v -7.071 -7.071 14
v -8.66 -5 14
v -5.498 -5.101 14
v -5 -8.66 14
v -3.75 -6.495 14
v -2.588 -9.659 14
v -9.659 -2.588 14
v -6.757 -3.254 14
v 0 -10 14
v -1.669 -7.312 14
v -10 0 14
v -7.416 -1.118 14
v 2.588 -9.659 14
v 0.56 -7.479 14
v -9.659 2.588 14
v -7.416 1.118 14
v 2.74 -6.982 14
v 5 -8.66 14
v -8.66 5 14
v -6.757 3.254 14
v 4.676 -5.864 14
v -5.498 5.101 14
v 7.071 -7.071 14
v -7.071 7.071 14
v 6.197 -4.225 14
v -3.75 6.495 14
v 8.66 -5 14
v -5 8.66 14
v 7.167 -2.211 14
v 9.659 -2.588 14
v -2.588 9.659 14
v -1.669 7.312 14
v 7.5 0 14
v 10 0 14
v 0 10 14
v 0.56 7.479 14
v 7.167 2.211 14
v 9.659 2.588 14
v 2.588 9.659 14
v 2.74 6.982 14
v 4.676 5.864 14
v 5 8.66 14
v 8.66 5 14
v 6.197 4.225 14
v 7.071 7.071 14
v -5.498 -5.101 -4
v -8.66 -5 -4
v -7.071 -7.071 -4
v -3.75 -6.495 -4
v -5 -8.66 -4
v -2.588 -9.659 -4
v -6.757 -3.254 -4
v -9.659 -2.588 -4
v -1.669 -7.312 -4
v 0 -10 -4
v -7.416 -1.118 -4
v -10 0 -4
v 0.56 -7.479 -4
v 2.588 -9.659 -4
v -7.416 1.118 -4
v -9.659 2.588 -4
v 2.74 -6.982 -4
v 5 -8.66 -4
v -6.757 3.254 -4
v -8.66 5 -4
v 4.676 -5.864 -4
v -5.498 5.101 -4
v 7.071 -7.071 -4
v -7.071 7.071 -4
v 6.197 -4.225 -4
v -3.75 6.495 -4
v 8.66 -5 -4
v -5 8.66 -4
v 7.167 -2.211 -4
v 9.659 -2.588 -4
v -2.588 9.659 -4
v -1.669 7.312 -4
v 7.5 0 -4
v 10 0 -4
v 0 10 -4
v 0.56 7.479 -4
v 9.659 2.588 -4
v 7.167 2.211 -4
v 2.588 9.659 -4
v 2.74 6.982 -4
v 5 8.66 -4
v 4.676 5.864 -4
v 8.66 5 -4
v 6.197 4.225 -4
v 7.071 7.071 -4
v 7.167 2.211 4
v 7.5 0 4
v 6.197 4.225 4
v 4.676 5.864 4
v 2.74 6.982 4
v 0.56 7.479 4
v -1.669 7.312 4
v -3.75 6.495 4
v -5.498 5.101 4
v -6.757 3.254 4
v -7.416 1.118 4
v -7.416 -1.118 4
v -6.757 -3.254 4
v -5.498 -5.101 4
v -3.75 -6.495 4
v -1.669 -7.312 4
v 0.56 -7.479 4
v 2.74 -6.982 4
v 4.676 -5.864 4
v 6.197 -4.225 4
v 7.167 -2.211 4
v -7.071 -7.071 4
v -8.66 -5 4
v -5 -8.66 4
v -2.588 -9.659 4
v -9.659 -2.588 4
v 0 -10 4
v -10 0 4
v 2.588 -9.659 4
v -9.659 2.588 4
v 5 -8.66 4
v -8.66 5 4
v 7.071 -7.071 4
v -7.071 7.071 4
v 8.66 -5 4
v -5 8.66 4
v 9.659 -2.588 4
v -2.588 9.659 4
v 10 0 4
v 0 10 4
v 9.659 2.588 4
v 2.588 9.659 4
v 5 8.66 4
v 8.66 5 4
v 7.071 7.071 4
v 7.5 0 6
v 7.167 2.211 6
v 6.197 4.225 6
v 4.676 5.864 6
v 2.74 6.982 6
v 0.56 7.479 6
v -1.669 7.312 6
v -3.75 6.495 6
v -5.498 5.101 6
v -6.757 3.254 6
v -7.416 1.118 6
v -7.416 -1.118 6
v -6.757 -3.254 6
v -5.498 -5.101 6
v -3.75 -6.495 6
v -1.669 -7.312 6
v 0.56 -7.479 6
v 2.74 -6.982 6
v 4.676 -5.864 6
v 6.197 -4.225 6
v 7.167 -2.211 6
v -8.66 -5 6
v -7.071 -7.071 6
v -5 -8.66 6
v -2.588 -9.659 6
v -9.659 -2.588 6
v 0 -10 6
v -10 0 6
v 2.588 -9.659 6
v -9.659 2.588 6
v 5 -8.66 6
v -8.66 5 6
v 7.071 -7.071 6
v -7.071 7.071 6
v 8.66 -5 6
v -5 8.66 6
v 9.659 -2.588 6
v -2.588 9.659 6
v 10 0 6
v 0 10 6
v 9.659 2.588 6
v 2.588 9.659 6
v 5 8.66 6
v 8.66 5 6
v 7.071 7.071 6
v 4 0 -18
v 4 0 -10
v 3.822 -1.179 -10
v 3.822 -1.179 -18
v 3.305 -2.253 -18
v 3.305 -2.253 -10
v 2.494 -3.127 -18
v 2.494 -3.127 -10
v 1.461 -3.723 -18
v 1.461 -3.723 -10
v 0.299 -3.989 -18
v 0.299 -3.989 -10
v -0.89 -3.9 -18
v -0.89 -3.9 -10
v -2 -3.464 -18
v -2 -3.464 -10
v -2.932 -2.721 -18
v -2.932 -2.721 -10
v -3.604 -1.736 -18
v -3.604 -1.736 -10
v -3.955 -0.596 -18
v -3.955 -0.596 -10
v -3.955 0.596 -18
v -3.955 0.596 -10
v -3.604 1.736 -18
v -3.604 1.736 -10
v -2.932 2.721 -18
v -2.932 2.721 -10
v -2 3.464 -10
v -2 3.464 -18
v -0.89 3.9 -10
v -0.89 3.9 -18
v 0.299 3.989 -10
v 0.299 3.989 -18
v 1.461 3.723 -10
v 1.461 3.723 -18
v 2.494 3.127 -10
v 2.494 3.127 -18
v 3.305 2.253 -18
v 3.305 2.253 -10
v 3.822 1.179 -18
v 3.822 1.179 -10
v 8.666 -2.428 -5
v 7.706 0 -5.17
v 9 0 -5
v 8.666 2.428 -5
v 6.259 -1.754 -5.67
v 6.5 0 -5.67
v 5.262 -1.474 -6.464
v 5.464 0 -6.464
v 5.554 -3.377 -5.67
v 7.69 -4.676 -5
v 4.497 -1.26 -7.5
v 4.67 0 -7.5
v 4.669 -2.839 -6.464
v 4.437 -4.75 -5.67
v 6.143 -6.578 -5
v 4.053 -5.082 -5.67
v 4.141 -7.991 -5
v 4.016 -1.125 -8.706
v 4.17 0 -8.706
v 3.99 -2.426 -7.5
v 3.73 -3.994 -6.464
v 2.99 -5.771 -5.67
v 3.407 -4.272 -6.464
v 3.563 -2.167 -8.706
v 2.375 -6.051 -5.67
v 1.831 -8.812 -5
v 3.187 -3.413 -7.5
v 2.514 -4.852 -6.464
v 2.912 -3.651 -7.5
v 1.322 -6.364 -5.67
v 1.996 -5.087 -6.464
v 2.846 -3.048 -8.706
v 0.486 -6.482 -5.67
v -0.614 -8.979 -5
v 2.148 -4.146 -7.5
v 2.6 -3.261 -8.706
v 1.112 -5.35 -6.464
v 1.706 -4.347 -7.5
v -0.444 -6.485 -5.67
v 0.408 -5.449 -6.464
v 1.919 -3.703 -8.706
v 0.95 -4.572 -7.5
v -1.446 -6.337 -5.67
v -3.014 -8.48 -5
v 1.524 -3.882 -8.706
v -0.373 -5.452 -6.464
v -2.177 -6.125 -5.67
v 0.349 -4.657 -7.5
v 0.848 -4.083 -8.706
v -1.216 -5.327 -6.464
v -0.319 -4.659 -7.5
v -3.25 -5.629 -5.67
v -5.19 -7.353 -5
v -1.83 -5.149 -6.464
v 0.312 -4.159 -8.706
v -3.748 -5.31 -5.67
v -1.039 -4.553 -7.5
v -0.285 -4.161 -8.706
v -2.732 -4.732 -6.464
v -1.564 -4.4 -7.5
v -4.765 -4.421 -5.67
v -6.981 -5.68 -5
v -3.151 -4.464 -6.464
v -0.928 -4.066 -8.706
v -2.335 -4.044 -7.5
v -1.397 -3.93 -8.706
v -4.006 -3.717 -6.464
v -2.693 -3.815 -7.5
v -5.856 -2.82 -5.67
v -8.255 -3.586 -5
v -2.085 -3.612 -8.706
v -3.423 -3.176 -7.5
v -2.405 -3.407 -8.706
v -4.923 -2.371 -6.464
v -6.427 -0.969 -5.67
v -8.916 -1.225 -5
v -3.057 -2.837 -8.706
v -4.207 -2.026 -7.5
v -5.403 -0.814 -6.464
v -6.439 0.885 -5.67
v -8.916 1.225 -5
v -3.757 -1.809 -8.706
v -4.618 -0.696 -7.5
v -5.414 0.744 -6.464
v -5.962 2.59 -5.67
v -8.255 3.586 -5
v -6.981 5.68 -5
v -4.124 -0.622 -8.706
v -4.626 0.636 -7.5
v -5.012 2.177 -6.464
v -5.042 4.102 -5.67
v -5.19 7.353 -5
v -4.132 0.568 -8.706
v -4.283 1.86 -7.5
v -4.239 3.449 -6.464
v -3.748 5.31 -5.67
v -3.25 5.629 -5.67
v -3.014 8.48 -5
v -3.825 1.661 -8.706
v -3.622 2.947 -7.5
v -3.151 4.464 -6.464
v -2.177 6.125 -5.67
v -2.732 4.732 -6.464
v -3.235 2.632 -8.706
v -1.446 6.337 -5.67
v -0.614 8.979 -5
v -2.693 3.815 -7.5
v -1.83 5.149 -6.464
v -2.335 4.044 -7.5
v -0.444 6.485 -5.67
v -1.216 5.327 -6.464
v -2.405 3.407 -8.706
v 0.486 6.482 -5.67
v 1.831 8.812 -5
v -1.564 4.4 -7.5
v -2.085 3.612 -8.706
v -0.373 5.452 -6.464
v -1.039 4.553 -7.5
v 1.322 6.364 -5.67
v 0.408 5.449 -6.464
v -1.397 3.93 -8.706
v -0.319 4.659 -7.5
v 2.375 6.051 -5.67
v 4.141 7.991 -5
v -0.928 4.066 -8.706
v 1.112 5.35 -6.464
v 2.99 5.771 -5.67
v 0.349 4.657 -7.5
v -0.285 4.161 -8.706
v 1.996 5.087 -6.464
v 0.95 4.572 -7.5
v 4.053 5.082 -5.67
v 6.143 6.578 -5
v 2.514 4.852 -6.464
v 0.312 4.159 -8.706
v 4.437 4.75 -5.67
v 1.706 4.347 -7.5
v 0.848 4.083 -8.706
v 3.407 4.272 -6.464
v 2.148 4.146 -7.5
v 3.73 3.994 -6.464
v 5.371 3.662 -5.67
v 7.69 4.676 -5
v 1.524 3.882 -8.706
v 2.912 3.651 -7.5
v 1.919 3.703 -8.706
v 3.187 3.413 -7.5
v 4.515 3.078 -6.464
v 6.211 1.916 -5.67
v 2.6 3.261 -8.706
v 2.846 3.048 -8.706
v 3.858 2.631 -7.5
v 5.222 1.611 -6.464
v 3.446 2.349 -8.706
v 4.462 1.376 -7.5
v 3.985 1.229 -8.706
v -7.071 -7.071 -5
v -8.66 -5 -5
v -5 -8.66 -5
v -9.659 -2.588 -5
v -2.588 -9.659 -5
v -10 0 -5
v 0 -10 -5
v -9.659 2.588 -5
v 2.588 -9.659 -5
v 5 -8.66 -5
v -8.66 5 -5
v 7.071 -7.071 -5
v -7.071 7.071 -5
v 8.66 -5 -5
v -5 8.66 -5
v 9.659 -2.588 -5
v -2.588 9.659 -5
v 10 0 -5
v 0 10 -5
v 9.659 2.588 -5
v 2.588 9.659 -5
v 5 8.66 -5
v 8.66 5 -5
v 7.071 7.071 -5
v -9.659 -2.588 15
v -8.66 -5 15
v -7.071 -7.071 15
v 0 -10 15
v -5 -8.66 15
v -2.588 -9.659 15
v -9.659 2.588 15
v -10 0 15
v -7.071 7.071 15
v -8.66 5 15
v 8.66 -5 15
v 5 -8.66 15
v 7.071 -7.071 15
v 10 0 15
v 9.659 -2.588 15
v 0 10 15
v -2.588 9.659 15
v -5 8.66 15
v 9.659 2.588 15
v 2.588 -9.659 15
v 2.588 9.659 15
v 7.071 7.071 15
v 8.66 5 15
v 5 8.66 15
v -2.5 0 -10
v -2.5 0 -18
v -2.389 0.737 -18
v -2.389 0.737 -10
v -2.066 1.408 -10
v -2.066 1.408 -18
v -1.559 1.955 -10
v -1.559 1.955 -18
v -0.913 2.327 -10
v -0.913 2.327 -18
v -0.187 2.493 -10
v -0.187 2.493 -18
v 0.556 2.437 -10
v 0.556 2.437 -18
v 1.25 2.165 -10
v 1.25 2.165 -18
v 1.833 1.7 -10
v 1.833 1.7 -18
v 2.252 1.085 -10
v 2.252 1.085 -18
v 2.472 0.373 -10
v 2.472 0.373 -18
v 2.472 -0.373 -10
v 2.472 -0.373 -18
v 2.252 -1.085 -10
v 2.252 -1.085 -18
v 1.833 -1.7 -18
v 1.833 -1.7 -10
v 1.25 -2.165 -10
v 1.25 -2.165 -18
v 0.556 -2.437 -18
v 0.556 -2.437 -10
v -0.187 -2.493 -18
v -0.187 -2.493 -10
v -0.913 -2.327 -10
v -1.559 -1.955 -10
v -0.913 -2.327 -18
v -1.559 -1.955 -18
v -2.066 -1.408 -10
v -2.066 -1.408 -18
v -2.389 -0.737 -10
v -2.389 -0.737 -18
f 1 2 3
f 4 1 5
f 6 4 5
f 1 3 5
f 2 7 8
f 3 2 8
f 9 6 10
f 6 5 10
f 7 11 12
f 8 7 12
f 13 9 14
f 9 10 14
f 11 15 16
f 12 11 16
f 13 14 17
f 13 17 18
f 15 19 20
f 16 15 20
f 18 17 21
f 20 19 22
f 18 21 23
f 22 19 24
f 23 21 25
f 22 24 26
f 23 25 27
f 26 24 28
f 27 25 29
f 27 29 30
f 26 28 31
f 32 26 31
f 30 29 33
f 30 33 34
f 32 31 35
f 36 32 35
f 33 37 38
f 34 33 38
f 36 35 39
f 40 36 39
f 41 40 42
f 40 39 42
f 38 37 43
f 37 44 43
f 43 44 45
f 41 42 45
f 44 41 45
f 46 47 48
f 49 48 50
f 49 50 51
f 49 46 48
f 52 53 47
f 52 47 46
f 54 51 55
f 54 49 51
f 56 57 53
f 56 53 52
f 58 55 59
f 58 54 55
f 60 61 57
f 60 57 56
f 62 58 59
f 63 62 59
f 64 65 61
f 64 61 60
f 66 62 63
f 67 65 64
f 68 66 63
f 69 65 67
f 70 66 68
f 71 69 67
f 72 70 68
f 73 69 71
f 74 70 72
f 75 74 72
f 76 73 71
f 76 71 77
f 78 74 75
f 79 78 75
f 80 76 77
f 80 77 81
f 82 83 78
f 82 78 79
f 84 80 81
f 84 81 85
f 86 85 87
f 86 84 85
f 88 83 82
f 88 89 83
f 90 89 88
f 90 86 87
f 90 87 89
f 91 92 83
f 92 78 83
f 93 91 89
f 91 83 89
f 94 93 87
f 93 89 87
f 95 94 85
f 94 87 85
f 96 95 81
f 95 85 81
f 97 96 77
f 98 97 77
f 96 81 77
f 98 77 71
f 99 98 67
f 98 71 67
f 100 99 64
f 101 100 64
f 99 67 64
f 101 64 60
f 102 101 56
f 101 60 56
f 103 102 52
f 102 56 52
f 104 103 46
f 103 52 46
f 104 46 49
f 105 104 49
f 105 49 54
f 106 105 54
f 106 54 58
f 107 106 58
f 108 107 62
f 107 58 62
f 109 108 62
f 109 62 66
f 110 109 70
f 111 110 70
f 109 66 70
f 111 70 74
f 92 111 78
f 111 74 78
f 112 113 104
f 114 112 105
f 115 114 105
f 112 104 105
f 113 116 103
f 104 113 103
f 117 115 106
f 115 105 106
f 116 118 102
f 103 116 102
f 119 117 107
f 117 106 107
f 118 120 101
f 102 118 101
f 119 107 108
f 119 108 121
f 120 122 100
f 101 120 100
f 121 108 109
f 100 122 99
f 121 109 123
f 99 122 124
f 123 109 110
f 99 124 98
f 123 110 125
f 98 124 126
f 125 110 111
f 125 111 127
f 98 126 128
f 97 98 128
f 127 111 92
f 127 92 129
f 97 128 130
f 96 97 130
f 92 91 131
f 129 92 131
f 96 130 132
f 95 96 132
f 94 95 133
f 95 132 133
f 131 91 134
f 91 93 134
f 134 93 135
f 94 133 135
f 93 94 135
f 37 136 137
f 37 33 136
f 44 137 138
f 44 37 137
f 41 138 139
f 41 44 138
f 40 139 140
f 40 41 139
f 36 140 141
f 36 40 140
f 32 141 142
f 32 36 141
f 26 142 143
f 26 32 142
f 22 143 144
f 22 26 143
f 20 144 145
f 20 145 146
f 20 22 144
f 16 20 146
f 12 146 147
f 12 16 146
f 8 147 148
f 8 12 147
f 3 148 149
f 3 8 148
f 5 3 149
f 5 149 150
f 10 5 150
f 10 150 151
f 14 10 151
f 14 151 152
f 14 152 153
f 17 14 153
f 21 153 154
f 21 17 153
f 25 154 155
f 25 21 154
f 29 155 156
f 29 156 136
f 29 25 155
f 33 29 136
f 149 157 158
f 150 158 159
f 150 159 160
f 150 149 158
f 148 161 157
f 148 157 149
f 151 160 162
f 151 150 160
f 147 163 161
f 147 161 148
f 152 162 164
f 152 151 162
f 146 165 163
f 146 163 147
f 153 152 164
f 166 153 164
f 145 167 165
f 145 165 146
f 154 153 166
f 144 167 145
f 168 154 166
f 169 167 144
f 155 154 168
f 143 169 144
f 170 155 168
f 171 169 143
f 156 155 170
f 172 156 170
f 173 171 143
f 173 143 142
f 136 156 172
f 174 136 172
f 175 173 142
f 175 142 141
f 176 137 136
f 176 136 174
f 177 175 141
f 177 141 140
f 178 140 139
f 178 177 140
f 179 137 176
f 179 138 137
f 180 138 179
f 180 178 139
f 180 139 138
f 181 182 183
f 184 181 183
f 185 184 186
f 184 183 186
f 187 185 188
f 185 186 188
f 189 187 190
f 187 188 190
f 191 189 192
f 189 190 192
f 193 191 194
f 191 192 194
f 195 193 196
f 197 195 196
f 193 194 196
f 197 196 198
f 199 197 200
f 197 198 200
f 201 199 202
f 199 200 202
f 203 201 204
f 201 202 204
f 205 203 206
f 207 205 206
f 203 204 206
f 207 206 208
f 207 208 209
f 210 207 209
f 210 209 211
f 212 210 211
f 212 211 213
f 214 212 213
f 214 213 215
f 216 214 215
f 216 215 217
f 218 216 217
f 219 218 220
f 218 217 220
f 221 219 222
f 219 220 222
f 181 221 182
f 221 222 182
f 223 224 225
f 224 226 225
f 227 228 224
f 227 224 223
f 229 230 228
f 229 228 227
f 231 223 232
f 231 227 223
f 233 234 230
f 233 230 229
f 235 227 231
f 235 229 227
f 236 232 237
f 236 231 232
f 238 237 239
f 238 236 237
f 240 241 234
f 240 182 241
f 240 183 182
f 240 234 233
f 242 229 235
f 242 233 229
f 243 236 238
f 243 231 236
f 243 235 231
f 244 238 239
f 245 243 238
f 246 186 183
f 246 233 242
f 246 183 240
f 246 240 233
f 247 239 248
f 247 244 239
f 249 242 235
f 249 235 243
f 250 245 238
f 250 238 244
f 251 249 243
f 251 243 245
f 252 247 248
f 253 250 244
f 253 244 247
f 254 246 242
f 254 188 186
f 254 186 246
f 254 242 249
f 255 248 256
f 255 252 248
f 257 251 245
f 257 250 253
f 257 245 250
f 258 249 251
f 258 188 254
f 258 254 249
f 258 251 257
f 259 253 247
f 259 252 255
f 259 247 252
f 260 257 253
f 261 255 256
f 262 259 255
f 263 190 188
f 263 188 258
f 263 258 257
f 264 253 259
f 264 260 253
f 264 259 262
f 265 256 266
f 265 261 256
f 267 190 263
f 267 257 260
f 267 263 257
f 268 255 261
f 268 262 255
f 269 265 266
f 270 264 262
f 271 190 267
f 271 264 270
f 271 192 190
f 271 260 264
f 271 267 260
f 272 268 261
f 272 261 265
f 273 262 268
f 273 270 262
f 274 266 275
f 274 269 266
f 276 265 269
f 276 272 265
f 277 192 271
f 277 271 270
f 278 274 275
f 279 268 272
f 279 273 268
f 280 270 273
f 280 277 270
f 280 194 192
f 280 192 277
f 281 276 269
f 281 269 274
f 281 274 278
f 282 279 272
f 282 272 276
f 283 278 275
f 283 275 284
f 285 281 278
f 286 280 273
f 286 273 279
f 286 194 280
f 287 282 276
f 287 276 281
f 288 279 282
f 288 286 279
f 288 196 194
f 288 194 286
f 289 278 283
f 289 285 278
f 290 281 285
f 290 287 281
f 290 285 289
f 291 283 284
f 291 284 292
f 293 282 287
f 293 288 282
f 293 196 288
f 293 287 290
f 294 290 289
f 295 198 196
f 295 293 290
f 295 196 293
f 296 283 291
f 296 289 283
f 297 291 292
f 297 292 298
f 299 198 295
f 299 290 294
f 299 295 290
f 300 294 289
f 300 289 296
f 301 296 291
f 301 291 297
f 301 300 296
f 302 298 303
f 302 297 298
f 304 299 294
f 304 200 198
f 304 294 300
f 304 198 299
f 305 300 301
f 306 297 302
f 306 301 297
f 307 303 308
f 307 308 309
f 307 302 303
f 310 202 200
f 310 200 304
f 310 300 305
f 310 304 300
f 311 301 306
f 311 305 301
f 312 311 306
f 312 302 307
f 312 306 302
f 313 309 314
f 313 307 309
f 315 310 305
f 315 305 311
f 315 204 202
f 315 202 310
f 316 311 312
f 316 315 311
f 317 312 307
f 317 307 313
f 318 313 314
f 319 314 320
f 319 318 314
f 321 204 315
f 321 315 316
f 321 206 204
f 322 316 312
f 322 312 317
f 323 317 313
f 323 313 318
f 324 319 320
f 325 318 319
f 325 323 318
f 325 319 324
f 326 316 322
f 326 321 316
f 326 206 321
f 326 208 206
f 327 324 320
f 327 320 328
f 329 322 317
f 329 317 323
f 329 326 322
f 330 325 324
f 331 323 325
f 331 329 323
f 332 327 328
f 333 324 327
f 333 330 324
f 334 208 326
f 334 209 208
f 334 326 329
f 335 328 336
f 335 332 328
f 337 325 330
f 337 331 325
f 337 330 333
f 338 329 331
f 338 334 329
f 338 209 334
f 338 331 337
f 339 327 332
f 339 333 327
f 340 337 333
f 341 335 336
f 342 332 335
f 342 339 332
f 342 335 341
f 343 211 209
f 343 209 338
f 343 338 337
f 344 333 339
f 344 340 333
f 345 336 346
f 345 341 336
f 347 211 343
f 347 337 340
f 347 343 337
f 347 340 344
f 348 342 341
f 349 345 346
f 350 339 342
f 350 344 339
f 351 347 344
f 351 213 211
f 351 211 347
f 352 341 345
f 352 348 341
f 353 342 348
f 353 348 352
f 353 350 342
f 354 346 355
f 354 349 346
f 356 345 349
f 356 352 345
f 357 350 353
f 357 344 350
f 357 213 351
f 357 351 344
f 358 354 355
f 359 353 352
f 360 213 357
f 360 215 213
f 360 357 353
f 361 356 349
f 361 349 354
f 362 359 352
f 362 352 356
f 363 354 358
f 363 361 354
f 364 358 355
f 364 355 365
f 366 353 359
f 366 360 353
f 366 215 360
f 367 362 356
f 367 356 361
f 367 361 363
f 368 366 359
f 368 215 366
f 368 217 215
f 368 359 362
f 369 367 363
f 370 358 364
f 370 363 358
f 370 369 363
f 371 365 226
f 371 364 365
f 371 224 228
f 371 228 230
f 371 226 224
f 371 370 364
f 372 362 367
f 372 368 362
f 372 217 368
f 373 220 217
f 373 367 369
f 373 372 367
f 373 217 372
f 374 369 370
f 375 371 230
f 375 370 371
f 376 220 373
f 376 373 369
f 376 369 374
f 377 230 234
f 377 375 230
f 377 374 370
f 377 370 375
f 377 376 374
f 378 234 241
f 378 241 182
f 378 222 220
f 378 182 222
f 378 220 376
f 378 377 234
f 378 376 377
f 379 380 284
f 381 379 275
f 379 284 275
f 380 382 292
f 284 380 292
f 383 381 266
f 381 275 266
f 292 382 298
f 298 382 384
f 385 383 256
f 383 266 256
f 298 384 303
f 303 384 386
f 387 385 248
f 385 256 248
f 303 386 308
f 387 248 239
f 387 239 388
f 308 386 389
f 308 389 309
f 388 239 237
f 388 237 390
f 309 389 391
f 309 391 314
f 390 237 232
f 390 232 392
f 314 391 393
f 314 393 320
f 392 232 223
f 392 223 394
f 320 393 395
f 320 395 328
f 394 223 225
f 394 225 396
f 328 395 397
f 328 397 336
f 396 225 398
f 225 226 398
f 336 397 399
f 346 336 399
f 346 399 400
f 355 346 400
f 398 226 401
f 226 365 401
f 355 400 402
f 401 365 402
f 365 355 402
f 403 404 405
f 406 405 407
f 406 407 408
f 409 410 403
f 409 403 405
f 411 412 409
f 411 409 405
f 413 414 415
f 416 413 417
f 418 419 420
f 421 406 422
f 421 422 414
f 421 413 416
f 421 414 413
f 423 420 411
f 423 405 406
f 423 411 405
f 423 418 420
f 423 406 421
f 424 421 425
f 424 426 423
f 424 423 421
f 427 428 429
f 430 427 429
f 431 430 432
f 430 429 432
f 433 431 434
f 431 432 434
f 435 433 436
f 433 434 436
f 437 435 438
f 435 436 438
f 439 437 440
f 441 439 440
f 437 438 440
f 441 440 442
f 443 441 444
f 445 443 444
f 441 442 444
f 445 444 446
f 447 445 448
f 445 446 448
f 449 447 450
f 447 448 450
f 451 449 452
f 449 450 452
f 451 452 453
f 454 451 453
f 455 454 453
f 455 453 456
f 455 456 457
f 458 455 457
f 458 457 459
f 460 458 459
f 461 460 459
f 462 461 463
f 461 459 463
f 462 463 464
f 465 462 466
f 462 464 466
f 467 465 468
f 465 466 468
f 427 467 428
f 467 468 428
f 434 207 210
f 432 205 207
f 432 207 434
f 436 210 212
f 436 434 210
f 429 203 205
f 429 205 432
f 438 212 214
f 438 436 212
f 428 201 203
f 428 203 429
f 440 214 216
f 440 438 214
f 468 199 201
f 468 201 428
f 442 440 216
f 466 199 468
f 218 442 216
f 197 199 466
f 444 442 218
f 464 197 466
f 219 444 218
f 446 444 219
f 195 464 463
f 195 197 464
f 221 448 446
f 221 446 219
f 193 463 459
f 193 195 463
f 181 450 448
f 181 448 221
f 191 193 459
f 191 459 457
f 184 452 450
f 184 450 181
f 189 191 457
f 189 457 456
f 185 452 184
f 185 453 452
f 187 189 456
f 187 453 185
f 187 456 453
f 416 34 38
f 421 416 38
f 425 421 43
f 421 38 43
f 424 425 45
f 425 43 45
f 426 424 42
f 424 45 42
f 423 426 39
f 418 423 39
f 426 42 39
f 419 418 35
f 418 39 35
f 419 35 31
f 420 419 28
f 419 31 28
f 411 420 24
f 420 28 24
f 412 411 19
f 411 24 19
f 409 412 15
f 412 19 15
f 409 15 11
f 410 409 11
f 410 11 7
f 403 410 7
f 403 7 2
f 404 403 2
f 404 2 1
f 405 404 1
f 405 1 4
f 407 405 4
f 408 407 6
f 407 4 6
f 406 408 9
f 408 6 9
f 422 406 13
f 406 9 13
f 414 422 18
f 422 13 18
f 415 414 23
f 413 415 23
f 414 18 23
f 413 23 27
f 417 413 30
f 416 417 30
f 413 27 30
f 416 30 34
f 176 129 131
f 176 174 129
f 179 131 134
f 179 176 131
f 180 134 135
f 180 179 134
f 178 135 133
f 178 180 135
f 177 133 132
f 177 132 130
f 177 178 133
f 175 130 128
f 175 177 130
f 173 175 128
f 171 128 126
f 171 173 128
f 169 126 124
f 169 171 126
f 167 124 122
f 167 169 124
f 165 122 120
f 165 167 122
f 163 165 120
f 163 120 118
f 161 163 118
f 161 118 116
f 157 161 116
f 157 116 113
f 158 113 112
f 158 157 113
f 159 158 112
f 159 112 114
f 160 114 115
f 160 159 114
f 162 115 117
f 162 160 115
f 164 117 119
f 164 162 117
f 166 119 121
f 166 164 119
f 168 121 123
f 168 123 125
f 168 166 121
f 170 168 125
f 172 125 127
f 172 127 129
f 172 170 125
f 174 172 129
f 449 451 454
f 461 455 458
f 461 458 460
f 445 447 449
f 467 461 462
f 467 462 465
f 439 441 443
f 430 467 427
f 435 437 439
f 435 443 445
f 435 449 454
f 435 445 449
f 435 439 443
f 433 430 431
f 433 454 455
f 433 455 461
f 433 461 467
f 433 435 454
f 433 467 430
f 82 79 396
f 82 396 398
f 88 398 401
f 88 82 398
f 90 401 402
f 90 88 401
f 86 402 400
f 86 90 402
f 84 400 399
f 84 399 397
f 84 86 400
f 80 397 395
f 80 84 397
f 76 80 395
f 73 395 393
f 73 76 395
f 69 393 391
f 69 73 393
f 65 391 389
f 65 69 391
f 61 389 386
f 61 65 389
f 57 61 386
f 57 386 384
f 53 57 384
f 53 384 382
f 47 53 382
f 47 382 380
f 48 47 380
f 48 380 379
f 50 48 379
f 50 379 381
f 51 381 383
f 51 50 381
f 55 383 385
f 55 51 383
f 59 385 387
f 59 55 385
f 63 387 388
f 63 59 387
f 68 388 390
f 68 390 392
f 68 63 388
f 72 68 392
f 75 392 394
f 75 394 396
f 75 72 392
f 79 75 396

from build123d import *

# Parameters (mm, degrees)
CROQUIS1_R              = 10
SALIENTE_EXTRUIR1_DEPTH = 5
CROQUIS2_R              = 10
CROQUIS2_R_2            = 7.5
CORTAR_EXTRUIR1_DEPTH   = 4
CROQUIS3_R              = 4
SALIENTE_EXTRUIR2_DEPTH = 13
CROQUIS4_R              = 2.5
CORTAR_EXTRUIR2_DEPTH   = 8
REDONDEO1_R             = 5


with BuildPart() as part:
    # Croquis1 → Saliente-Extruir1 (new, symmetric)
    with BuildSketch(Plane(origin=(0, 0, 0), x_dir=(0, 1, 0), z_dir=(0, 0, 1))):
        with Locations(Location((0, 0, 0), (0, 0, 270))):
            Circle(CROQUIS1_R)
    extrude(amount=SALIENTE_EXTRUIR1_DEPTH, both=True)

    # Croquis2 → Cortar-Extruir1 (cut, symmetric)
    with BuildSketch(Plane(origin=(0, 0, 0), x_dir=(0, 1, 0), z_dir=(0, 0, 1))):
        with Locations(Location((0, 0, 0), (0, 0, 270))):
            Circle(CROQUIS2_R)
        with Locations(Location((0, 0, 0), (0, 0, 270))):
            Circle(CROQUIS2_R_2, mode=Mode.SUBTRACT)
    extrude(amount=CORTAR_EXTRUIR1_DEPTH, both=True, mode=Mode.SUBTRACT)

    # Simetría2: part across plane


with BuildPart() as part_1:
    add(part.part)
    add(part.part.mirror(Plane.XY.offset(5)))

    # Croquis3 → Saliente-Extruir2 (add)
    with BuildSketch(Plane(origin=(0, 0, -5), x_dir=(-1, 0, 0), z_dir=(0, 0, -1))):
        with Locations(Location((0, 0, 0), (0, 0, 180))):
            Circle(CROQUIS3_R)
    extrude(amount=SALIENTE_EXTRUIR2_DEPTH)

    # Croquis4 → Cortar-Extruir2 (cut)
    with BuildSketch(Plane(origin=(0, 0, -18), x_dir=(-1, 0, 0), z_dir=(0, 0, -1))):
        Circle(CROQUIS4_R)
    extrude(amount=-CORTAR_EXTRUIR2_DEPTH, mode=Mode.SUBTRACT)

    # Redondeo1
    redondeo1_edges = [part_1.edges().sort_by_distance(p)[0] for p in [
        (-4, 0, -5),
    ]]
    fillet(redondeo1_edges, radius=REDONDEO1_R)


solid = part_1.part
